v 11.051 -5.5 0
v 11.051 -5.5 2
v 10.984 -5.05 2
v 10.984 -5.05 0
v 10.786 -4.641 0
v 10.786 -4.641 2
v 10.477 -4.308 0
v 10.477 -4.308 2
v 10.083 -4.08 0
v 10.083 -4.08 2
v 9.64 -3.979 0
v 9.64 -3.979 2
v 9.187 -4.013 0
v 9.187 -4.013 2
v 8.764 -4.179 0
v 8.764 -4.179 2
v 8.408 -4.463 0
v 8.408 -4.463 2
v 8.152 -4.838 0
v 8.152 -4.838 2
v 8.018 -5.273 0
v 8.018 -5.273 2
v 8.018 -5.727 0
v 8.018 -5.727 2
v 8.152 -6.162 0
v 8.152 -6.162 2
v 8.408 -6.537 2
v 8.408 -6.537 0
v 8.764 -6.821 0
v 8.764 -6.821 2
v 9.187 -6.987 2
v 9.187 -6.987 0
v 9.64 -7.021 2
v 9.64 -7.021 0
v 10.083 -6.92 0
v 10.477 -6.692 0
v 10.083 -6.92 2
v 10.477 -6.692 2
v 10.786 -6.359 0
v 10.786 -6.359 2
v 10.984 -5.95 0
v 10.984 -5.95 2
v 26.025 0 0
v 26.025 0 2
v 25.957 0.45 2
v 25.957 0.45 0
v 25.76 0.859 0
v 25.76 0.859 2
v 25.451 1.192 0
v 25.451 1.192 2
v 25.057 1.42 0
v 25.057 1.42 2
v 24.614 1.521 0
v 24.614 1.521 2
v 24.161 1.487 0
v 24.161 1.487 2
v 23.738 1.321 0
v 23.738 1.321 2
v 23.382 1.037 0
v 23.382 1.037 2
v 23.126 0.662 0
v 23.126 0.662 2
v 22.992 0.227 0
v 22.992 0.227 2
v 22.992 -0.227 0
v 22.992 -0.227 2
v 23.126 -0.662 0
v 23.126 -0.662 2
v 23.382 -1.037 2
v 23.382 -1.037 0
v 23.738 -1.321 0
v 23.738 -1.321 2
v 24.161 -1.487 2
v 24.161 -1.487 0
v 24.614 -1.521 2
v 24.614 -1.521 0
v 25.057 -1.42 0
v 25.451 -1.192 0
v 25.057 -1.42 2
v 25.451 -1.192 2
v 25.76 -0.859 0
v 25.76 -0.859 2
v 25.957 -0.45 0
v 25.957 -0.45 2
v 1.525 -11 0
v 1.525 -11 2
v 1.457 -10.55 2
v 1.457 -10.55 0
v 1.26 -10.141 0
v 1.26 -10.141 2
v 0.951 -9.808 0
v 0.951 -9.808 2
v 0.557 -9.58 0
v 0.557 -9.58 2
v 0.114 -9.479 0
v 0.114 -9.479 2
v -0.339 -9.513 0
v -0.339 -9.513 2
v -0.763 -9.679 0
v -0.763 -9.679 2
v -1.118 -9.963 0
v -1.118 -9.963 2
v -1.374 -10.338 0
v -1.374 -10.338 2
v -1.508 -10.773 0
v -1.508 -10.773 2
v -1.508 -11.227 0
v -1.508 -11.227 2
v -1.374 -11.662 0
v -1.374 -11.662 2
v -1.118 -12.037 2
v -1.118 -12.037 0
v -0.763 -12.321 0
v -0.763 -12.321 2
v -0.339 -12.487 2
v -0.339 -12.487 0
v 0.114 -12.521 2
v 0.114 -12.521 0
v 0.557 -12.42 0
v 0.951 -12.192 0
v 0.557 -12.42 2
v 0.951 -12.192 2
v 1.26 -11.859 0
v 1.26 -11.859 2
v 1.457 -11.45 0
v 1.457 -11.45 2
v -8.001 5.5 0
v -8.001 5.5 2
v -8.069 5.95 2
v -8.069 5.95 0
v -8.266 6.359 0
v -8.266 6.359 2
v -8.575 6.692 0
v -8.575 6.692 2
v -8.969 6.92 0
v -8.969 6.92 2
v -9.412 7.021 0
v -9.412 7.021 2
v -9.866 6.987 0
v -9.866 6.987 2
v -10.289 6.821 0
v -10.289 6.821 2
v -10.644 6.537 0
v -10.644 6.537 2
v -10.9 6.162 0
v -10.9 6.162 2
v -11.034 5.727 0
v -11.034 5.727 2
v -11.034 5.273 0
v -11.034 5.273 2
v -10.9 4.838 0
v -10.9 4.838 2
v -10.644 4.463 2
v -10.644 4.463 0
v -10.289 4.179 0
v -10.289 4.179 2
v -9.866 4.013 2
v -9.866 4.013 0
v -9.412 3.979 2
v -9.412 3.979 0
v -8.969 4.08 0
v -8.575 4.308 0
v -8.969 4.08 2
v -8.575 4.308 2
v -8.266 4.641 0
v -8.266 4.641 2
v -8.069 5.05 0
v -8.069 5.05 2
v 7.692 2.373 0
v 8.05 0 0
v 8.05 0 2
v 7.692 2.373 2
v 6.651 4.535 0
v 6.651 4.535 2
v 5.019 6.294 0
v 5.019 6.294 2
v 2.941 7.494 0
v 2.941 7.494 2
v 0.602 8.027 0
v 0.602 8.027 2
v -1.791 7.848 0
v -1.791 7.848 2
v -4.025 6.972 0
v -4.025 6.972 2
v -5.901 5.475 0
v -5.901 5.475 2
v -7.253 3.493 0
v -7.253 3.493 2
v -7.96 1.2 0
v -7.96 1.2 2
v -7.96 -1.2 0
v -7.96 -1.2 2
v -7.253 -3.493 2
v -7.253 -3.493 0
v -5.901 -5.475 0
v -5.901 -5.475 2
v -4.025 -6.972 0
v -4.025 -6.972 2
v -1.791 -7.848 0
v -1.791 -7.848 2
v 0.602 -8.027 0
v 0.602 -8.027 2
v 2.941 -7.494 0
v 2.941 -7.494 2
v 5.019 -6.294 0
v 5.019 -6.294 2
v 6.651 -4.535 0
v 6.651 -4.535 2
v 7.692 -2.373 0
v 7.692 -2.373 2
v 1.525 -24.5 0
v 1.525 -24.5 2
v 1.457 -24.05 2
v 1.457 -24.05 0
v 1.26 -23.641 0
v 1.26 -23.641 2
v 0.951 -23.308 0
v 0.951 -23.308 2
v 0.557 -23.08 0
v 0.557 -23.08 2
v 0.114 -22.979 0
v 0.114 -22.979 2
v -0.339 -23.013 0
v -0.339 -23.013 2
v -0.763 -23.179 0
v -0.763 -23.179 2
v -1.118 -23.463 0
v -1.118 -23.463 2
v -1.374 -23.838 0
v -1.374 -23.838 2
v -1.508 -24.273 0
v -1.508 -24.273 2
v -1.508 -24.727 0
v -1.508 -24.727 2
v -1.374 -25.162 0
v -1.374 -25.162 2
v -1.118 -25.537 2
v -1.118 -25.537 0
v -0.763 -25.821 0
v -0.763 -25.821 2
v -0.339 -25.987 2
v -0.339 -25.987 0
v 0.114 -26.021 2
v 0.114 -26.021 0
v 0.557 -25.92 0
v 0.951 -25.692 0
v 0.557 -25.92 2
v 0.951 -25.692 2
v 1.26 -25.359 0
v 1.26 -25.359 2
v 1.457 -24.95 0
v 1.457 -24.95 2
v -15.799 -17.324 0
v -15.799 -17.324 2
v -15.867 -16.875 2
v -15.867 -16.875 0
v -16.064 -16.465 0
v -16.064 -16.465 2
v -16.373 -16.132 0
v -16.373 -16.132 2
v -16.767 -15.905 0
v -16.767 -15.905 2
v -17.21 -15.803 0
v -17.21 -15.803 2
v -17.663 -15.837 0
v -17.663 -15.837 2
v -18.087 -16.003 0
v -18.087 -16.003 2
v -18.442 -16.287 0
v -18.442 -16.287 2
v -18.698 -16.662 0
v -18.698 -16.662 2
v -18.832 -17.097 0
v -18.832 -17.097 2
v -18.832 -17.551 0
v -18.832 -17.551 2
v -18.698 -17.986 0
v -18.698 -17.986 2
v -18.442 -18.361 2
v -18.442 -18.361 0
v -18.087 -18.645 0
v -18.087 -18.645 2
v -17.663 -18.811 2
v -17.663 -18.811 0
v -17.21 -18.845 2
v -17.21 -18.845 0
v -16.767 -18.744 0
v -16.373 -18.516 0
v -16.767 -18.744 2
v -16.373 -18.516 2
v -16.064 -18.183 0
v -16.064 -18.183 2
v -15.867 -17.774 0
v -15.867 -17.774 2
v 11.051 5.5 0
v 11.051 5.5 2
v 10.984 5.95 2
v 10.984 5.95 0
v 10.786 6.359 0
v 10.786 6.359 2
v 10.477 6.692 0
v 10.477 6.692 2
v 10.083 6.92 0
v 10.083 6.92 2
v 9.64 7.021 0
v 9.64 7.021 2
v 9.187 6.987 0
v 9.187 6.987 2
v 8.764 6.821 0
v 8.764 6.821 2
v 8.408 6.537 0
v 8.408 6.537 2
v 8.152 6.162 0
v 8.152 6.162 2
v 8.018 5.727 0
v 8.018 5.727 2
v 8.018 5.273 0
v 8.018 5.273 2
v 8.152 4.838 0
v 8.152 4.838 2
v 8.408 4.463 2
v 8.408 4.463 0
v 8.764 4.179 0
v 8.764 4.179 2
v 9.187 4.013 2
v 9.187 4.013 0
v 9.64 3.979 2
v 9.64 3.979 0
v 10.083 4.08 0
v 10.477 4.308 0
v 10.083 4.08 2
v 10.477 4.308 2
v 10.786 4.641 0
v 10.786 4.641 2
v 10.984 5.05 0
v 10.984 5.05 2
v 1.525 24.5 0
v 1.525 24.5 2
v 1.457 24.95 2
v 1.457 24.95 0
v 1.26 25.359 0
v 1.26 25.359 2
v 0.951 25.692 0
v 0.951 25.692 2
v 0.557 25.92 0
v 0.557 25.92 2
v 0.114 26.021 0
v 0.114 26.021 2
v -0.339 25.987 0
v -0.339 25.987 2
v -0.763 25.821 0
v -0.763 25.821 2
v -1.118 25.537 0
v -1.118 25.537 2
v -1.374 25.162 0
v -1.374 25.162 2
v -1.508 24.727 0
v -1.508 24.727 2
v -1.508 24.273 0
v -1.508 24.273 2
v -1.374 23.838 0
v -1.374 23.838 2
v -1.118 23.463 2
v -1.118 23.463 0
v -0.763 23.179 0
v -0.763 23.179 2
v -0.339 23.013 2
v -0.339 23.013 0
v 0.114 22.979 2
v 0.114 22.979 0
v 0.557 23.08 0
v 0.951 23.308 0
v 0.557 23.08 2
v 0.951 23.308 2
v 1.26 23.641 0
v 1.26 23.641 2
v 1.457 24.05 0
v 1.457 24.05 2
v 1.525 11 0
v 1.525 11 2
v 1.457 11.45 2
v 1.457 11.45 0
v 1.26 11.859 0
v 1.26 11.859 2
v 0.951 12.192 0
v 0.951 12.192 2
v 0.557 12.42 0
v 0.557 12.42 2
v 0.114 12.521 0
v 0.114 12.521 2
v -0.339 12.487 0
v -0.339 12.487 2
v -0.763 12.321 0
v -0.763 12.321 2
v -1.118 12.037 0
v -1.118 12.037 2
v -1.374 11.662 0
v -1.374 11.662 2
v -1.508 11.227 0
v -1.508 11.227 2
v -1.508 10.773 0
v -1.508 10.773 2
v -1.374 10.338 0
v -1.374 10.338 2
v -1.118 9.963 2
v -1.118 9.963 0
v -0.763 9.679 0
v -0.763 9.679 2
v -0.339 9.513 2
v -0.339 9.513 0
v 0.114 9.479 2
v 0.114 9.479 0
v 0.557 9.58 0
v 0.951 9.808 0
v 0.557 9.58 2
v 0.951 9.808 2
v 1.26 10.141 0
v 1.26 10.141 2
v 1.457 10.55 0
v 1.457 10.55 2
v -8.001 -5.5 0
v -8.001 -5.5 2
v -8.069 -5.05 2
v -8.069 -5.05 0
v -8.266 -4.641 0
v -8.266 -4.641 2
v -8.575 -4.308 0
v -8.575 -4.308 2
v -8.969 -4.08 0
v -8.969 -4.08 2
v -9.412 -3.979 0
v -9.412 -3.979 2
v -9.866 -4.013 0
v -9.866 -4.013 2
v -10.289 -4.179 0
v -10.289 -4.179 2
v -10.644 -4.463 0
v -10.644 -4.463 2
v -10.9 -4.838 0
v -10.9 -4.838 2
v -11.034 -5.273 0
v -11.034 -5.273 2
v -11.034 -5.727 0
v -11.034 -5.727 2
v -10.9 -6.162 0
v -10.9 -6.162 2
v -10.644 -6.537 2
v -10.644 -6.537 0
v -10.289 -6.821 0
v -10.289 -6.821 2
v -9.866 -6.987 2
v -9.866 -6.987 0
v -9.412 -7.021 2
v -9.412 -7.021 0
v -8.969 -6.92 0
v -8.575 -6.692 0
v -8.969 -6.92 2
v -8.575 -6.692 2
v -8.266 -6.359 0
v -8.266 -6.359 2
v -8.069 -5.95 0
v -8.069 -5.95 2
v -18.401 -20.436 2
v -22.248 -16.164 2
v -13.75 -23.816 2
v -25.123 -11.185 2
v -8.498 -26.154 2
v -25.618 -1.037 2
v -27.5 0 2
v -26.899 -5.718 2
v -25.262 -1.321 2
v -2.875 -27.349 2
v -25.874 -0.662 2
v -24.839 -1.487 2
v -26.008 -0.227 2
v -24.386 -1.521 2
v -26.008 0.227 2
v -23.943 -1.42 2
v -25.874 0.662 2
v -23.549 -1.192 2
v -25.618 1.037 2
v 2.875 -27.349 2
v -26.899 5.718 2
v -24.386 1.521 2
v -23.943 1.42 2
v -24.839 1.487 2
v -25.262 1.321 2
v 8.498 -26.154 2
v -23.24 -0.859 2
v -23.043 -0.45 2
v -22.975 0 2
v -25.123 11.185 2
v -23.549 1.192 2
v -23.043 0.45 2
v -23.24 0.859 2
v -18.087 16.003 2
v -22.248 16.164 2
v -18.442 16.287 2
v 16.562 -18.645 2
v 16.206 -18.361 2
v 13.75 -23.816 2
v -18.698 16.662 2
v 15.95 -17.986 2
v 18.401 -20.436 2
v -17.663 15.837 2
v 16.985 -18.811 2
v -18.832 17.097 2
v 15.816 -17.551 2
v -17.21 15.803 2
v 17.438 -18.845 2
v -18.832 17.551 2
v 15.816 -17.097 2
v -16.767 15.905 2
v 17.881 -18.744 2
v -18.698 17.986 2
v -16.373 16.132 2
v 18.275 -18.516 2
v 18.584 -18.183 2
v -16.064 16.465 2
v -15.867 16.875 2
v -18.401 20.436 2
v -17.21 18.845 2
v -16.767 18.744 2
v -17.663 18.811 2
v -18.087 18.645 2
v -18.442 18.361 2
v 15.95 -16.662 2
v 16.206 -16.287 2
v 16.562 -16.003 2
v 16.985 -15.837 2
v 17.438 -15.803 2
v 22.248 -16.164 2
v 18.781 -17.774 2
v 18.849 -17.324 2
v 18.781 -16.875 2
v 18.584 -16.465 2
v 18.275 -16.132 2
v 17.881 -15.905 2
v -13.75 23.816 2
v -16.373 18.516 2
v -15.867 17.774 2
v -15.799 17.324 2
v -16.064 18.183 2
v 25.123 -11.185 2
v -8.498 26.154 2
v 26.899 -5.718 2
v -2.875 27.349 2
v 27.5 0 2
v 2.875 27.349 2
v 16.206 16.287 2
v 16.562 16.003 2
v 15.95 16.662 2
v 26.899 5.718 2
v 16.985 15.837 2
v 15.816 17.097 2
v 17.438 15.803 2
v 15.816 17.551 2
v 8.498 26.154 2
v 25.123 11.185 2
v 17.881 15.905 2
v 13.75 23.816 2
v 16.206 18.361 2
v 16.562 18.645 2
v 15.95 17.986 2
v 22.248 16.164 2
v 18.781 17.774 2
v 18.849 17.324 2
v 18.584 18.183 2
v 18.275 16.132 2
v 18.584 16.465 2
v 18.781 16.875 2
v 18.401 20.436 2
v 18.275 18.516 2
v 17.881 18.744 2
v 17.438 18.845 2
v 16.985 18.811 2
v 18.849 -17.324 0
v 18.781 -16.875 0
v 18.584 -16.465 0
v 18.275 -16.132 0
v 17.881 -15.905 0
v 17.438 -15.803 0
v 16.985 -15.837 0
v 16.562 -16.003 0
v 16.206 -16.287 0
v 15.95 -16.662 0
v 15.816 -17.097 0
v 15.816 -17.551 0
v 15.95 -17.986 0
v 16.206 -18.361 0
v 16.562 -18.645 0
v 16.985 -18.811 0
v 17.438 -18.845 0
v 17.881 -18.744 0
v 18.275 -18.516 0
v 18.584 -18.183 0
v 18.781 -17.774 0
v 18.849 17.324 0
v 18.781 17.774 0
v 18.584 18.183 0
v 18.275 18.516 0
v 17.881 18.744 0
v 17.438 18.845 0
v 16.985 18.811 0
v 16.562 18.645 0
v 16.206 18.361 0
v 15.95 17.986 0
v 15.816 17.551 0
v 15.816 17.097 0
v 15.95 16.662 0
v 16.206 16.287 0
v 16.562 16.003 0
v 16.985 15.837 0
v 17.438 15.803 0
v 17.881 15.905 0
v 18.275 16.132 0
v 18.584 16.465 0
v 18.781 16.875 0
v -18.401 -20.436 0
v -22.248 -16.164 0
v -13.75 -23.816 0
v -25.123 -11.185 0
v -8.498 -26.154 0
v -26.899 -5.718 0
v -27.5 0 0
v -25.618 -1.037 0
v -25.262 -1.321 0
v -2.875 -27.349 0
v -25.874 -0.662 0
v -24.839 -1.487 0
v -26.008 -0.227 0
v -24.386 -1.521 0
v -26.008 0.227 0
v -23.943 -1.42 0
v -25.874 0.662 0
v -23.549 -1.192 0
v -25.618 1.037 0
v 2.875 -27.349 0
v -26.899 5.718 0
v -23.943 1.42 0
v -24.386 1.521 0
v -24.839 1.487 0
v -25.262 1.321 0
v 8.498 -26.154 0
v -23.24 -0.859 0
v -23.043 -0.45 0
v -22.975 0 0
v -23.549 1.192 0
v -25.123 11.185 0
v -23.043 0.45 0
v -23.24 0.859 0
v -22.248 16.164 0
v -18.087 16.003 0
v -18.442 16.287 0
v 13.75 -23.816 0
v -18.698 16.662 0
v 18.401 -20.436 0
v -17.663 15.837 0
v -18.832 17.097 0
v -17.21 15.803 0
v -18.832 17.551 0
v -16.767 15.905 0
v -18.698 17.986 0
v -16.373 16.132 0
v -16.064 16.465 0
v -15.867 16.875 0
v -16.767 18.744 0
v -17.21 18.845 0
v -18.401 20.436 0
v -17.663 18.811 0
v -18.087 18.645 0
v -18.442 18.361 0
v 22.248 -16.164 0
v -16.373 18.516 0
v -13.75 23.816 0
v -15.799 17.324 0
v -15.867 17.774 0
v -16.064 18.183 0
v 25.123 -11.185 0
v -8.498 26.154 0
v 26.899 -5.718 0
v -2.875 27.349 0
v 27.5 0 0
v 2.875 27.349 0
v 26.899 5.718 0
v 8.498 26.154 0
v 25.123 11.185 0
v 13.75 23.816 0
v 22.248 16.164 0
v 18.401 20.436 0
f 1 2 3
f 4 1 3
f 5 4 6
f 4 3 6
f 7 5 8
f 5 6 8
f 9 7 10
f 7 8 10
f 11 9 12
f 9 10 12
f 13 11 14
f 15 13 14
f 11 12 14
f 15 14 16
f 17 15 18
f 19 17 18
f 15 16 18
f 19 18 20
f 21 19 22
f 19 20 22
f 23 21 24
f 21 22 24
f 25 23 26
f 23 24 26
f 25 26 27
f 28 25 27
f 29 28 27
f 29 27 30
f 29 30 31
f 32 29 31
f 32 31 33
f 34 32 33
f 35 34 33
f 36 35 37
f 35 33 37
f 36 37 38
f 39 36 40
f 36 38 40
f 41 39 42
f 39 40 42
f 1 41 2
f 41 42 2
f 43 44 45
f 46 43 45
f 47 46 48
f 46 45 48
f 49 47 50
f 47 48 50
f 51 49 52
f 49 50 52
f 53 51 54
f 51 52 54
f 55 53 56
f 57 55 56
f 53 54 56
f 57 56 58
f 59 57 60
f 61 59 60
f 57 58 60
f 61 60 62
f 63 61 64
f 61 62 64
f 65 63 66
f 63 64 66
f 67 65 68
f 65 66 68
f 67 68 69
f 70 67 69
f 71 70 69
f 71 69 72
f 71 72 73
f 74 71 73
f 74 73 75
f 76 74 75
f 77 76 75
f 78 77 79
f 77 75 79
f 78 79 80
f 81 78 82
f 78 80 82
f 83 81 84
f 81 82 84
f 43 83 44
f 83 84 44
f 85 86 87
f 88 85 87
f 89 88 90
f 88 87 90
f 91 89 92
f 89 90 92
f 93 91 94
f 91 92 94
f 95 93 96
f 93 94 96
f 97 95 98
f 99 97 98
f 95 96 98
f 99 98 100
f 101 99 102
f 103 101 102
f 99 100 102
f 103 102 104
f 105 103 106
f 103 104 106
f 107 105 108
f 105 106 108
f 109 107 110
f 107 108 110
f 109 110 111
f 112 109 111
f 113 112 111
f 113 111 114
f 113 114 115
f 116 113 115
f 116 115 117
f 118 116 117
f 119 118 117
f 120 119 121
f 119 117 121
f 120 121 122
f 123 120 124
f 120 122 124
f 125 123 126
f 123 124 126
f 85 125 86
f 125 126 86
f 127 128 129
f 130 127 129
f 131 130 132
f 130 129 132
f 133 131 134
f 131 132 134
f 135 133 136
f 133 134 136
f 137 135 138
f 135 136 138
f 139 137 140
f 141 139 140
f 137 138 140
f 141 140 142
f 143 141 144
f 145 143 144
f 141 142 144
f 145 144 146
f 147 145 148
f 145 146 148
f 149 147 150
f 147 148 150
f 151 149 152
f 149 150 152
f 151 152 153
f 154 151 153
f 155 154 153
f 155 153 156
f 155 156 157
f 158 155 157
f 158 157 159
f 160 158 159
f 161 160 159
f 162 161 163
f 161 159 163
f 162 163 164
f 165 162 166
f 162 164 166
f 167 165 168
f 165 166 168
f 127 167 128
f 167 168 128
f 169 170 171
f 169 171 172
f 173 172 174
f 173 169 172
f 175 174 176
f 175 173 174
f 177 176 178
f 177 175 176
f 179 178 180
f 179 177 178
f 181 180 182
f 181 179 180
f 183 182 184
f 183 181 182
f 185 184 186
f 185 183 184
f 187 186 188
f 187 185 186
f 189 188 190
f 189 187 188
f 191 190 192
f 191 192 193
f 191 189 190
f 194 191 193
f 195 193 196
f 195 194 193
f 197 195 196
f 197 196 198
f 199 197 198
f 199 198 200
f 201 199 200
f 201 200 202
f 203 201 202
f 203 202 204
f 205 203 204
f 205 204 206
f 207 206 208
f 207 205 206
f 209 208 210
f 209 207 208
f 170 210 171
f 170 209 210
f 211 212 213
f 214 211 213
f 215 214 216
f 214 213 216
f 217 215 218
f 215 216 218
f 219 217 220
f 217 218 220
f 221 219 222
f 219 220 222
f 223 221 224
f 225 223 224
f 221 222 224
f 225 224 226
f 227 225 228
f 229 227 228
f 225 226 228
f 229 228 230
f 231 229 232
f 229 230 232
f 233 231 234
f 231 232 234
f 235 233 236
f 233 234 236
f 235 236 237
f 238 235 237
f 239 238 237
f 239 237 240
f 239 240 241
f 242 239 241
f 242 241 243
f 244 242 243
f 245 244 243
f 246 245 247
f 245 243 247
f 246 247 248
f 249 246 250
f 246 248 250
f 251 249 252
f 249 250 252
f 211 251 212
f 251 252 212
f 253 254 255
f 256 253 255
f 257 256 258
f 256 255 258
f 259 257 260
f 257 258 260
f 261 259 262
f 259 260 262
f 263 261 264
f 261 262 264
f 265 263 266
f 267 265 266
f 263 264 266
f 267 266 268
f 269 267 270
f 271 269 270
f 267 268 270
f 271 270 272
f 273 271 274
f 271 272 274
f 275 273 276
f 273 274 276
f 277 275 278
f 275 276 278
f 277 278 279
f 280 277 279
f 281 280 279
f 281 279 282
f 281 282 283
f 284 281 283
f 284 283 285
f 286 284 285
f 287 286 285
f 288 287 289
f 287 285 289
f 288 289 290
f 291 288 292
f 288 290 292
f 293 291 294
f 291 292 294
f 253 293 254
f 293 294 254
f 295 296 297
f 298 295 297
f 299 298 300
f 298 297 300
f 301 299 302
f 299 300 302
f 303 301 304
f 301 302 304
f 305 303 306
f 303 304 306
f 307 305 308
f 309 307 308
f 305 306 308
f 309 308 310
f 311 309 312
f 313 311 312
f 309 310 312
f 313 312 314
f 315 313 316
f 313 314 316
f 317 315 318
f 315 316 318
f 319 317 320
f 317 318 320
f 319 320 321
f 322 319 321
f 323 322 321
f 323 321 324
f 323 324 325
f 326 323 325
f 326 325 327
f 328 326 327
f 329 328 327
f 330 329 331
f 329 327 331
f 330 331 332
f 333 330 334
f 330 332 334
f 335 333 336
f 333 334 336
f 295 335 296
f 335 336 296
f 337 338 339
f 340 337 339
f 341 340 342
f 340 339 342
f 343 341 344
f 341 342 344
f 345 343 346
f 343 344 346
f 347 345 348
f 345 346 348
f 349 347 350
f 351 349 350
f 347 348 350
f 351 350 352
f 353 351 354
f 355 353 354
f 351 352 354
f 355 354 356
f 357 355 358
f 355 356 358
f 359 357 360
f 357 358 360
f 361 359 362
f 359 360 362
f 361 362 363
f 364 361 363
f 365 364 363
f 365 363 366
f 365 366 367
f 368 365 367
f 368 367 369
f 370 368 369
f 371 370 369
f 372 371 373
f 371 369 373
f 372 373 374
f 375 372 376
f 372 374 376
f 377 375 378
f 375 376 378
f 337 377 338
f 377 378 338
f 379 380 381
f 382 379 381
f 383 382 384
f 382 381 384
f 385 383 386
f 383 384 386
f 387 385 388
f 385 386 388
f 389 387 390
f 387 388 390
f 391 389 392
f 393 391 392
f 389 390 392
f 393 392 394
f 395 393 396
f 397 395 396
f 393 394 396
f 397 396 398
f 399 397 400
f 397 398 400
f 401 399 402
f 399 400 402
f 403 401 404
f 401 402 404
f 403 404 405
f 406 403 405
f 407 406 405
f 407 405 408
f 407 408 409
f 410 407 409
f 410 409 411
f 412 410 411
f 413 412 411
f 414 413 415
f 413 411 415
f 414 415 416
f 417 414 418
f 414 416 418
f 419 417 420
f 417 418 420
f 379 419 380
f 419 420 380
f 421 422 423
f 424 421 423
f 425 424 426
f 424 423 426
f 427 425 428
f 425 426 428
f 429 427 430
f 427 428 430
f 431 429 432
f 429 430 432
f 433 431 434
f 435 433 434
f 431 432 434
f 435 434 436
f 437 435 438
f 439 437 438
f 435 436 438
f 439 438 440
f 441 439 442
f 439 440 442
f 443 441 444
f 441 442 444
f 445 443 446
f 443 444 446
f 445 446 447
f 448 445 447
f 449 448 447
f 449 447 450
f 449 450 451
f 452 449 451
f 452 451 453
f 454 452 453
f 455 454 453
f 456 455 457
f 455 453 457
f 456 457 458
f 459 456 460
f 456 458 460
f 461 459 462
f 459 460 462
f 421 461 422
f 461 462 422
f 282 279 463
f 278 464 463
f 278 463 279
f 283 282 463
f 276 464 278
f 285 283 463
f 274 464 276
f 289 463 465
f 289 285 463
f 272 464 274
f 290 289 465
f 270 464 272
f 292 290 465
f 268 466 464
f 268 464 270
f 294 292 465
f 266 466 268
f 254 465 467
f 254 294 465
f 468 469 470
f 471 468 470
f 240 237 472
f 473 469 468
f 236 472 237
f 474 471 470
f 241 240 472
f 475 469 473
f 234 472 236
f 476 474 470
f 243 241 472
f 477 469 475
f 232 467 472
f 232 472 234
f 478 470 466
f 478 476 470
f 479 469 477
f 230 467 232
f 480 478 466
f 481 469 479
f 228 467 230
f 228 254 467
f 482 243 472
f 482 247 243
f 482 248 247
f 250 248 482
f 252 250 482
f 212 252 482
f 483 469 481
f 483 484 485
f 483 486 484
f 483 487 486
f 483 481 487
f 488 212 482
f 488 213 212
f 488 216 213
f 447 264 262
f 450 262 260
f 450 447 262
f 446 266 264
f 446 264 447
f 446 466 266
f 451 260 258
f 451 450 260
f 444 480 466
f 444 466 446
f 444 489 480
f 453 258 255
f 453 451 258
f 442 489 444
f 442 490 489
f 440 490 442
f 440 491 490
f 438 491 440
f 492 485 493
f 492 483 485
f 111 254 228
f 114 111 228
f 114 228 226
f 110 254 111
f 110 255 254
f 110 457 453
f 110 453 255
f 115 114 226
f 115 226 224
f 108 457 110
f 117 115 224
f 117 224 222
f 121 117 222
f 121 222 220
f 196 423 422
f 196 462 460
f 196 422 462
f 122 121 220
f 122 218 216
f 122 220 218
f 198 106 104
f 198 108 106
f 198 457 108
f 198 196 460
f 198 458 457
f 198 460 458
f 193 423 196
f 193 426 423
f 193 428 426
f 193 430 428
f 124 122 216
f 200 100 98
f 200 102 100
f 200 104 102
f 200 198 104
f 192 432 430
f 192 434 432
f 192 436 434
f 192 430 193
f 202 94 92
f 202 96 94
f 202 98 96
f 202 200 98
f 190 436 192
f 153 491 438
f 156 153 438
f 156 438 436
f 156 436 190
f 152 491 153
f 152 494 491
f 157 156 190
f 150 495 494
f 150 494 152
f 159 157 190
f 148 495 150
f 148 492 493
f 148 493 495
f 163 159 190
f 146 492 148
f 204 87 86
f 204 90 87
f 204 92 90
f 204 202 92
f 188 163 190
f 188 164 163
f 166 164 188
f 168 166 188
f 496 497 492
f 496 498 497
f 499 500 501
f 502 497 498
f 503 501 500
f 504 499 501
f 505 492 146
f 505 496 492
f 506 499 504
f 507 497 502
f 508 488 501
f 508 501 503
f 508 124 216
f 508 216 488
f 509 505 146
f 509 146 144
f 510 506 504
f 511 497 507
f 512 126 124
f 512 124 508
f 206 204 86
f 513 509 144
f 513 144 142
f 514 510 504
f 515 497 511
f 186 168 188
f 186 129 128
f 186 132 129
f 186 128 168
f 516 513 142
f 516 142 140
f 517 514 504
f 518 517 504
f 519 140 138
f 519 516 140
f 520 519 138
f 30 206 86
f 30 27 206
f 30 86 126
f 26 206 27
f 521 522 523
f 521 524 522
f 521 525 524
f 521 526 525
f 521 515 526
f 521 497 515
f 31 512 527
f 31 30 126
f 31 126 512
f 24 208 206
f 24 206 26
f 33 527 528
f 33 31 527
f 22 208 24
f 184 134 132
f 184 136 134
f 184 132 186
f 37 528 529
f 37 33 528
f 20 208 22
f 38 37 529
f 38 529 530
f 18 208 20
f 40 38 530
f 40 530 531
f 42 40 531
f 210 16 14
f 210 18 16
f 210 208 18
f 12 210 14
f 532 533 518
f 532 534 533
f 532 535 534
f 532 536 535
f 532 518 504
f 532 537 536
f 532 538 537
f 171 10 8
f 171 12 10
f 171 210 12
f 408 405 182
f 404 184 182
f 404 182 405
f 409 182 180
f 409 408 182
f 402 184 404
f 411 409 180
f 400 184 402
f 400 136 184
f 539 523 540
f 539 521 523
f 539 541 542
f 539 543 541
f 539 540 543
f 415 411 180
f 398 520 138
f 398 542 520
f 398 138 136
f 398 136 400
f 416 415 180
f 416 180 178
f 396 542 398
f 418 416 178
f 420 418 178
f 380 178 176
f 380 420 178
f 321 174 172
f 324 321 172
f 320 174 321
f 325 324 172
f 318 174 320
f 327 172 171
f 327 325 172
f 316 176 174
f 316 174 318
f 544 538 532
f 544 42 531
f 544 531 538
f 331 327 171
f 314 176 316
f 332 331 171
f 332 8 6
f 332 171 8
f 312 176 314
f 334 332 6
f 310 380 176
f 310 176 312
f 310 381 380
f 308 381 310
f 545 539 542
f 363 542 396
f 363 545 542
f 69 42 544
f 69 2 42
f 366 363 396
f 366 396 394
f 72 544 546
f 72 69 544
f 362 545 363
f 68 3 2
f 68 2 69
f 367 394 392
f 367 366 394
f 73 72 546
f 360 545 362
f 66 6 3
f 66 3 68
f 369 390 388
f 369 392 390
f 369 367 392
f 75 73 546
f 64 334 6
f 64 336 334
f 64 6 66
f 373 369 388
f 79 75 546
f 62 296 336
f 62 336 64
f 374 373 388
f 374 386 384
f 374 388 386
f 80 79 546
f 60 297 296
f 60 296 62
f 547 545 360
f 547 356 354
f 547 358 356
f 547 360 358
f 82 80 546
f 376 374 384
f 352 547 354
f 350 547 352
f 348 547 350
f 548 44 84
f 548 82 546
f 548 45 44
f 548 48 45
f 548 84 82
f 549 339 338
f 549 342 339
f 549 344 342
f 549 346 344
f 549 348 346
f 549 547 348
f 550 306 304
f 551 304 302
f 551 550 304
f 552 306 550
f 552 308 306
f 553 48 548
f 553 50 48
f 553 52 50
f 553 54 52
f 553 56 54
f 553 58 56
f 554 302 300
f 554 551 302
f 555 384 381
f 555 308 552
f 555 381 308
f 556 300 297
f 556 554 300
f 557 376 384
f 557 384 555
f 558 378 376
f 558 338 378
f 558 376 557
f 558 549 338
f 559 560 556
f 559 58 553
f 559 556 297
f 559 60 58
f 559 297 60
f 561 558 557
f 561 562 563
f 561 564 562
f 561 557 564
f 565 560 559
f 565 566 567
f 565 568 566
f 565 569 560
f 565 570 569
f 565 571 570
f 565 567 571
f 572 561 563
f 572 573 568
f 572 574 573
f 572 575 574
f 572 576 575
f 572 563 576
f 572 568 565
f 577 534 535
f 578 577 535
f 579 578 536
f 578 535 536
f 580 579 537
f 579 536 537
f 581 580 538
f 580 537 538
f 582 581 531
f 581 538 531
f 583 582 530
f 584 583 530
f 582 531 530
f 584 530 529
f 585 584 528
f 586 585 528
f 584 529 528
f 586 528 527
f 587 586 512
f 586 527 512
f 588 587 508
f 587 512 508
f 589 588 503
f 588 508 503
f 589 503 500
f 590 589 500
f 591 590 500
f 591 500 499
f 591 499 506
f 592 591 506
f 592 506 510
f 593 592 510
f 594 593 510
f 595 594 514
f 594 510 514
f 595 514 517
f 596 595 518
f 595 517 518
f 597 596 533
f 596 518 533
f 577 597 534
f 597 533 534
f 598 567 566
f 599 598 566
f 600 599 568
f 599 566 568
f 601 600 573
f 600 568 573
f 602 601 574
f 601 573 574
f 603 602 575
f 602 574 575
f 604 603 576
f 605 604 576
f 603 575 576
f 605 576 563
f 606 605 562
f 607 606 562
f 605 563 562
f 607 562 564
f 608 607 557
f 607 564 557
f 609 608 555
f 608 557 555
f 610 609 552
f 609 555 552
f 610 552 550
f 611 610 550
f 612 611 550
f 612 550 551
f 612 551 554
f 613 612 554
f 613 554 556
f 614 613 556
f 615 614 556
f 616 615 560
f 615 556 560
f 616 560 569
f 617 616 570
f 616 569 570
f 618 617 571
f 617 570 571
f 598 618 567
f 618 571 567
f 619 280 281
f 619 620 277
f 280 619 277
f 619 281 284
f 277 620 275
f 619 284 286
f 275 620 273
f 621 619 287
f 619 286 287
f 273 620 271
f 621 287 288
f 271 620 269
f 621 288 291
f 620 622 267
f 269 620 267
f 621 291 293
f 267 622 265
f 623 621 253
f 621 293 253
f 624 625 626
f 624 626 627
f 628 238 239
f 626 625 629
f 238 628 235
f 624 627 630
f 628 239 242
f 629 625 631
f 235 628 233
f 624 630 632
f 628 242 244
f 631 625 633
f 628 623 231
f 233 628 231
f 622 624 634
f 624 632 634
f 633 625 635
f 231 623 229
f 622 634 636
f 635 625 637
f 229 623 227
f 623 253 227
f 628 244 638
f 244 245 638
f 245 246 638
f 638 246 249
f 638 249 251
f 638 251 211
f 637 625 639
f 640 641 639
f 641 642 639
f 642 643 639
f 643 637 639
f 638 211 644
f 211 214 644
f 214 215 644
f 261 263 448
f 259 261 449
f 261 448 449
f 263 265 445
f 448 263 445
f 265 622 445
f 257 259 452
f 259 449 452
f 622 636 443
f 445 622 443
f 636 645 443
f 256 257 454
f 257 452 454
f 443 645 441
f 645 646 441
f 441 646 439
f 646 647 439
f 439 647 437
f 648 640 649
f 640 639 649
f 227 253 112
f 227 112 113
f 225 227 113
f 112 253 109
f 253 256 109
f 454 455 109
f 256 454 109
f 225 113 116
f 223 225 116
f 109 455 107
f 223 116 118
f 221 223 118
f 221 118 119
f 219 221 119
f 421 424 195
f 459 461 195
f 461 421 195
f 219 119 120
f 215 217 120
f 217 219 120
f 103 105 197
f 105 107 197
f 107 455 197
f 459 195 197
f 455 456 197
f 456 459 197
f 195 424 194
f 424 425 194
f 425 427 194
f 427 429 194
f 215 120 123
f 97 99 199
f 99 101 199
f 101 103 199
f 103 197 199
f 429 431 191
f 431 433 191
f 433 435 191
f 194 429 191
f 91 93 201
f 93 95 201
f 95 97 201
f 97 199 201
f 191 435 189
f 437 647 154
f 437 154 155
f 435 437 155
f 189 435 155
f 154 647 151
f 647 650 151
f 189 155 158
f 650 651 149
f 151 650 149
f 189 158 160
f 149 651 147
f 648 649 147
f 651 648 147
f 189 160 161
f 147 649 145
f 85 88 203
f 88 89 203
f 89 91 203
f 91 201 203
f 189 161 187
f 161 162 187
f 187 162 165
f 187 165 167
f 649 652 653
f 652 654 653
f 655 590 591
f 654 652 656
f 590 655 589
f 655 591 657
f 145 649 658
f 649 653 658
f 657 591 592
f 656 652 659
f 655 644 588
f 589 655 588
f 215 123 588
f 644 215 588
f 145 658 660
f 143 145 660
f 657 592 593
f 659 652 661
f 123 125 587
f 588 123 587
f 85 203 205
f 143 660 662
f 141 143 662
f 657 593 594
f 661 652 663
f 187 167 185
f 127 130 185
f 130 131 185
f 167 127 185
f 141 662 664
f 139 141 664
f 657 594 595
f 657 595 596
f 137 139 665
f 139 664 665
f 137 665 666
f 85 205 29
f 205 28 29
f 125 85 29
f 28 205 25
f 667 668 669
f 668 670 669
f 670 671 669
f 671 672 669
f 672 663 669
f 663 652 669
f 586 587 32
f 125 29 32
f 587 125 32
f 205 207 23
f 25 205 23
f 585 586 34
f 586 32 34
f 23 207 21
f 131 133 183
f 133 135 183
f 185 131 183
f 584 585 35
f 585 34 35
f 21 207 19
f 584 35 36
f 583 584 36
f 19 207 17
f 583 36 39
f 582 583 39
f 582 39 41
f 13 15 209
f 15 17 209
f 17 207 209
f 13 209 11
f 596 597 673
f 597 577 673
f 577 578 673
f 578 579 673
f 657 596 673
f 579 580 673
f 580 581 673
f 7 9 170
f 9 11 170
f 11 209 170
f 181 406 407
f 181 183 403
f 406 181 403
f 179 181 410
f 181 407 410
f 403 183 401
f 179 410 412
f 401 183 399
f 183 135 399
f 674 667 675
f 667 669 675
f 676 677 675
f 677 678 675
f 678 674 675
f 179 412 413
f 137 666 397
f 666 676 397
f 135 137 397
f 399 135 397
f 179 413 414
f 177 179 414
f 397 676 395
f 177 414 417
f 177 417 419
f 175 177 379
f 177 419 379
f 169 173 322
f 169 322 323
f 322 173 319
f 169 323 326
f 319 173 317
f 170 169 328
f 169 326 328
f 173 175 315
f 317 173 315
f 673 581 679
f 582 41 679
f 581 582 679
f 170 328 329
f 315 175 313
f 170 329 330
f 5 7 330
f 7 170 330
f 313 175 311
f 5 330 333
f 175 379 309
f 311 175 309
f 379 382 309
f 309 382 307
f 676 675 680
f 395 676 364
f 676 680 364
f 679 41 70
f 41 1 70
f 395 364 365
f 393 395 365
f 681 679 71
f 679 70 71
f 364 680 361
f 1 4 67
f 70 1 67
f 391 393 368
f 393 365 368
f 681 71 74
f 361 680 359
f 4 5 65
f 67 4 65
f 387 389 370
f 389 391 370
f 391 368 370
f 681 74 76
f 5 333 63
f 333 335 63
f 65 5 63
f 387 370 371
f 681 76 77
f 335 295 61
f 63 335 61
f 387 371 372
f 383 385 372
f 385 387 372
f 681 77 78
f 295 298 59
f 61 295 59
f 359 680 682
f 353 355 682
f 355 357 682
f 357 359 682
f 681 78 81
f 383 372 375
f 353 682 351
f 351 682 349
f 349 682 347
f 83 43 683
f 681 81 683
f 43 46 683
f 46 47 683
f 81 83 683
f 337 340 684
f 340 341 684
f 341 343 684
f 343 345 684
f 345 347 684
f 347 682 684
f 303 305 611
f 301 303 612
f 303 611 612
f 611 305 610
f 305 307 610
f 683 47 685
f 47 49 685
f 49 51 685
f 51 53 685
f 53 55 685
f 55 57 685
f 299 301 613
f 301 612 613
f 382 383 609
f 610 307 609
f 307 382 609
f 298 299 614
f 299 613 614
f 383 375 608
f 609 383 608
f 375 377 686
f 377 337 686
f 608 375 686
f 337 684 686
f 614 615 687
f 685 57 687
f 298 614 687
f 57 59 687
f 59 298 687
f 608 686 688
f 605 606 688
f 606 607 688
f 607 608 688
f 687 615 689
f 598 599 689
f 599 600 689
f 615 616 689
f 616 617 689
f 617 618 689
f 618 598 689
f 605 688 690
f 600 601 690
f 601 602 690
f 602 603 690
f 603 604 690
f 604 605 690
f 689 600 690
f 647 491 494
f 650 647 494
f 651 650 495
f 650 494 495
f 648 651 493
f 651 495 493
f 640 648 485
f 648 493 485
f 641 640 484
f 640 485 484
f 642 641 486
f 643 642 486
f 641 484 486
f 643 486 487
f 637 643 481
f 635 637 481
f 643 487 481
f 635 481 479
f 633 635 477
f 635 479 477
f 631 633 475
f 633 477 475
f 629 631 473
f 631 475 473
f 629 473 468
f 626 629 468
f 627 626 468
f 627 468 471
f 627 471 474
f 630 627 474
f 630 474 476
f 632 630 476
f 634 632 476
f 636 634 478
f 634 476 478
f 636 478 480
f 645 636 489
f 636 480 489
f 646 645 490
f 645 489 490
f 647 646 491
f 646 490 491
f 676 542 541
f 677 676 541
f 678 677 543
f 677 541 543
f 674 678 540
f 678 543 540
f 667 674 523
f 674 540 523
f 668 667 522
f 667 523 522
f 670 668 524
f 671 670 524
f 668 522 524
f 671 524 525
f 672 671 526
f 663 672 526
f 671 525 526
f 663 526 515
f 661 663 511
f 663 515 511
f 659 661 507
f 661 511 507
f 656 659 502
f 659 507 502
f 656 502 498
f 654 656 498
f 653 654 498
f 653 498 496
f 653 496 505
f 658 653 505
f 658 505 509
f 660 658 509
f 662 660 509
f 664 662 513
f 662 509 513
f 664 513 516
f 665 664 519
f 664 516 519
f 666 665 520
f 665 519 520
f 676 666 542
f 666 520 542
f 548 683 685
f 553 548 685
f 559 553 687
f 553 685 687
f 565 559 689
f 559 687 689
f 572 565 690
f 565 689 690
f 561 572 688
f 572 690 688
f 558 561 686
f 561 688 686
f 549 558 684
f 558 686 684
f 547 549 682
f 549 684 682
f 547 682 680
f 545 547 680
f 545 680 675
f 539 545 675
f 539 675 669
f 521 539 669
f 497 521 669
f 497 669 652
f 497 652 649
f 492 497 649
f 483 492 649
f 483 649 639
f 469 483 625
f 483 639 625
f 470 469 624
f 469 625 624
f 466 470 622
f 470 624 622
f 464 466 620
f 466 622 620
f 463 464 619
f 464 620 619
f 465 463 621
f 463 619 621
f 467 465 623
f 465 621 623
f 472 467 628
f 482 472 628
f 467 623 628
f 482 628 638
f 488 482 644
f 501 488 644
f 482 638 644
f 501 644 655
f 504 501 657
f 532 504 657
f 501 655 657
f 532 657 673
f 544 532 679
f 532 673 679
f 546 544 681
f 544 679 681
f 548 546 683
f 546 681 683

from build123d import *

# Parameters (mm, degrees)
SKETCH_1_R          = 27.5
SKETCH_1_R_2        = 8.05
EXTRUDE_1_DEPTH     = 2
SKETCH_2_R          = 1.525
CUT_EXTRUDE_1_DEPTH = 2
SKETCH_3_R          = 1.525
CUT_EXTRUDE_2_DEPTH = 2


with BuildPart() as part:
    # 草图1 → 凸台-拉伸1 (new body)
    with BuildSketch(Plane.XY):
        Circle(SKETCH_1_R)
        Circle(SKETCH_1_R_2, mode=Mode.SUBTRACT)
    extrude(amount=EXTRUDE_1_DEPTH)

    # 草图2 → 切除-拉伸1 (cut)
    with BuildSketch(Plane.XY.offset(2)):
        with Locations((0, 11)):
            Circle(SKETCH_2_R)
        with Locations((9.526279442, 5.5)):
            Circle(SKETCH_2_R)
        with Locations((9.526279442, -5.5)):
            Circle(SKETCH_2_R)
        with Locations((0, -11)):
            Circle(SKETCH_2_R)
        with Locations((-9.526279442, -5.5)):
            Circle(SKETCH_2_R)
        with Locations((-9.526279442, 5.5)):
            Circle(SKETCH_2_R)
    extrude(amount=-CUT_EXTRUDE_1_DEPTH, mode=Mode.SUBTRACT)

    # 草图3 → 切除-拉伸2 (cut)
    with BuildSketch(Plane.XY.offset(2)):
        with Locations((0, 24.5)):
            Circle(SKETCH_3_R)
        with Locations((17.324116139, 17.324116139)):
            Circle(SKETCH_3_R)
        with Locations((24.5, 0)):
            Circle(SKETCH_3_R)
        with Locations((17.324116139, -17.324116139)):
            Circle(SKETCH_3_R)
        with Locations((0, -24.5)):
            Circle(SKETCH_3_R)
        with Locations((-17.324116139, -17.324116139)):
            Circle(SKETCH_3_R)
        with Locations((-24.5, 0)):
            Circle(SKETCH_3_R)
        with Locations((-17.324116139, 17.324116139)):
            Circle(SKETCH_3_R)
    extrude(amount=-CUT_EXTRUDE_2_DEPTH, mode=Mode.SUBTRACT)


solid = part.part
